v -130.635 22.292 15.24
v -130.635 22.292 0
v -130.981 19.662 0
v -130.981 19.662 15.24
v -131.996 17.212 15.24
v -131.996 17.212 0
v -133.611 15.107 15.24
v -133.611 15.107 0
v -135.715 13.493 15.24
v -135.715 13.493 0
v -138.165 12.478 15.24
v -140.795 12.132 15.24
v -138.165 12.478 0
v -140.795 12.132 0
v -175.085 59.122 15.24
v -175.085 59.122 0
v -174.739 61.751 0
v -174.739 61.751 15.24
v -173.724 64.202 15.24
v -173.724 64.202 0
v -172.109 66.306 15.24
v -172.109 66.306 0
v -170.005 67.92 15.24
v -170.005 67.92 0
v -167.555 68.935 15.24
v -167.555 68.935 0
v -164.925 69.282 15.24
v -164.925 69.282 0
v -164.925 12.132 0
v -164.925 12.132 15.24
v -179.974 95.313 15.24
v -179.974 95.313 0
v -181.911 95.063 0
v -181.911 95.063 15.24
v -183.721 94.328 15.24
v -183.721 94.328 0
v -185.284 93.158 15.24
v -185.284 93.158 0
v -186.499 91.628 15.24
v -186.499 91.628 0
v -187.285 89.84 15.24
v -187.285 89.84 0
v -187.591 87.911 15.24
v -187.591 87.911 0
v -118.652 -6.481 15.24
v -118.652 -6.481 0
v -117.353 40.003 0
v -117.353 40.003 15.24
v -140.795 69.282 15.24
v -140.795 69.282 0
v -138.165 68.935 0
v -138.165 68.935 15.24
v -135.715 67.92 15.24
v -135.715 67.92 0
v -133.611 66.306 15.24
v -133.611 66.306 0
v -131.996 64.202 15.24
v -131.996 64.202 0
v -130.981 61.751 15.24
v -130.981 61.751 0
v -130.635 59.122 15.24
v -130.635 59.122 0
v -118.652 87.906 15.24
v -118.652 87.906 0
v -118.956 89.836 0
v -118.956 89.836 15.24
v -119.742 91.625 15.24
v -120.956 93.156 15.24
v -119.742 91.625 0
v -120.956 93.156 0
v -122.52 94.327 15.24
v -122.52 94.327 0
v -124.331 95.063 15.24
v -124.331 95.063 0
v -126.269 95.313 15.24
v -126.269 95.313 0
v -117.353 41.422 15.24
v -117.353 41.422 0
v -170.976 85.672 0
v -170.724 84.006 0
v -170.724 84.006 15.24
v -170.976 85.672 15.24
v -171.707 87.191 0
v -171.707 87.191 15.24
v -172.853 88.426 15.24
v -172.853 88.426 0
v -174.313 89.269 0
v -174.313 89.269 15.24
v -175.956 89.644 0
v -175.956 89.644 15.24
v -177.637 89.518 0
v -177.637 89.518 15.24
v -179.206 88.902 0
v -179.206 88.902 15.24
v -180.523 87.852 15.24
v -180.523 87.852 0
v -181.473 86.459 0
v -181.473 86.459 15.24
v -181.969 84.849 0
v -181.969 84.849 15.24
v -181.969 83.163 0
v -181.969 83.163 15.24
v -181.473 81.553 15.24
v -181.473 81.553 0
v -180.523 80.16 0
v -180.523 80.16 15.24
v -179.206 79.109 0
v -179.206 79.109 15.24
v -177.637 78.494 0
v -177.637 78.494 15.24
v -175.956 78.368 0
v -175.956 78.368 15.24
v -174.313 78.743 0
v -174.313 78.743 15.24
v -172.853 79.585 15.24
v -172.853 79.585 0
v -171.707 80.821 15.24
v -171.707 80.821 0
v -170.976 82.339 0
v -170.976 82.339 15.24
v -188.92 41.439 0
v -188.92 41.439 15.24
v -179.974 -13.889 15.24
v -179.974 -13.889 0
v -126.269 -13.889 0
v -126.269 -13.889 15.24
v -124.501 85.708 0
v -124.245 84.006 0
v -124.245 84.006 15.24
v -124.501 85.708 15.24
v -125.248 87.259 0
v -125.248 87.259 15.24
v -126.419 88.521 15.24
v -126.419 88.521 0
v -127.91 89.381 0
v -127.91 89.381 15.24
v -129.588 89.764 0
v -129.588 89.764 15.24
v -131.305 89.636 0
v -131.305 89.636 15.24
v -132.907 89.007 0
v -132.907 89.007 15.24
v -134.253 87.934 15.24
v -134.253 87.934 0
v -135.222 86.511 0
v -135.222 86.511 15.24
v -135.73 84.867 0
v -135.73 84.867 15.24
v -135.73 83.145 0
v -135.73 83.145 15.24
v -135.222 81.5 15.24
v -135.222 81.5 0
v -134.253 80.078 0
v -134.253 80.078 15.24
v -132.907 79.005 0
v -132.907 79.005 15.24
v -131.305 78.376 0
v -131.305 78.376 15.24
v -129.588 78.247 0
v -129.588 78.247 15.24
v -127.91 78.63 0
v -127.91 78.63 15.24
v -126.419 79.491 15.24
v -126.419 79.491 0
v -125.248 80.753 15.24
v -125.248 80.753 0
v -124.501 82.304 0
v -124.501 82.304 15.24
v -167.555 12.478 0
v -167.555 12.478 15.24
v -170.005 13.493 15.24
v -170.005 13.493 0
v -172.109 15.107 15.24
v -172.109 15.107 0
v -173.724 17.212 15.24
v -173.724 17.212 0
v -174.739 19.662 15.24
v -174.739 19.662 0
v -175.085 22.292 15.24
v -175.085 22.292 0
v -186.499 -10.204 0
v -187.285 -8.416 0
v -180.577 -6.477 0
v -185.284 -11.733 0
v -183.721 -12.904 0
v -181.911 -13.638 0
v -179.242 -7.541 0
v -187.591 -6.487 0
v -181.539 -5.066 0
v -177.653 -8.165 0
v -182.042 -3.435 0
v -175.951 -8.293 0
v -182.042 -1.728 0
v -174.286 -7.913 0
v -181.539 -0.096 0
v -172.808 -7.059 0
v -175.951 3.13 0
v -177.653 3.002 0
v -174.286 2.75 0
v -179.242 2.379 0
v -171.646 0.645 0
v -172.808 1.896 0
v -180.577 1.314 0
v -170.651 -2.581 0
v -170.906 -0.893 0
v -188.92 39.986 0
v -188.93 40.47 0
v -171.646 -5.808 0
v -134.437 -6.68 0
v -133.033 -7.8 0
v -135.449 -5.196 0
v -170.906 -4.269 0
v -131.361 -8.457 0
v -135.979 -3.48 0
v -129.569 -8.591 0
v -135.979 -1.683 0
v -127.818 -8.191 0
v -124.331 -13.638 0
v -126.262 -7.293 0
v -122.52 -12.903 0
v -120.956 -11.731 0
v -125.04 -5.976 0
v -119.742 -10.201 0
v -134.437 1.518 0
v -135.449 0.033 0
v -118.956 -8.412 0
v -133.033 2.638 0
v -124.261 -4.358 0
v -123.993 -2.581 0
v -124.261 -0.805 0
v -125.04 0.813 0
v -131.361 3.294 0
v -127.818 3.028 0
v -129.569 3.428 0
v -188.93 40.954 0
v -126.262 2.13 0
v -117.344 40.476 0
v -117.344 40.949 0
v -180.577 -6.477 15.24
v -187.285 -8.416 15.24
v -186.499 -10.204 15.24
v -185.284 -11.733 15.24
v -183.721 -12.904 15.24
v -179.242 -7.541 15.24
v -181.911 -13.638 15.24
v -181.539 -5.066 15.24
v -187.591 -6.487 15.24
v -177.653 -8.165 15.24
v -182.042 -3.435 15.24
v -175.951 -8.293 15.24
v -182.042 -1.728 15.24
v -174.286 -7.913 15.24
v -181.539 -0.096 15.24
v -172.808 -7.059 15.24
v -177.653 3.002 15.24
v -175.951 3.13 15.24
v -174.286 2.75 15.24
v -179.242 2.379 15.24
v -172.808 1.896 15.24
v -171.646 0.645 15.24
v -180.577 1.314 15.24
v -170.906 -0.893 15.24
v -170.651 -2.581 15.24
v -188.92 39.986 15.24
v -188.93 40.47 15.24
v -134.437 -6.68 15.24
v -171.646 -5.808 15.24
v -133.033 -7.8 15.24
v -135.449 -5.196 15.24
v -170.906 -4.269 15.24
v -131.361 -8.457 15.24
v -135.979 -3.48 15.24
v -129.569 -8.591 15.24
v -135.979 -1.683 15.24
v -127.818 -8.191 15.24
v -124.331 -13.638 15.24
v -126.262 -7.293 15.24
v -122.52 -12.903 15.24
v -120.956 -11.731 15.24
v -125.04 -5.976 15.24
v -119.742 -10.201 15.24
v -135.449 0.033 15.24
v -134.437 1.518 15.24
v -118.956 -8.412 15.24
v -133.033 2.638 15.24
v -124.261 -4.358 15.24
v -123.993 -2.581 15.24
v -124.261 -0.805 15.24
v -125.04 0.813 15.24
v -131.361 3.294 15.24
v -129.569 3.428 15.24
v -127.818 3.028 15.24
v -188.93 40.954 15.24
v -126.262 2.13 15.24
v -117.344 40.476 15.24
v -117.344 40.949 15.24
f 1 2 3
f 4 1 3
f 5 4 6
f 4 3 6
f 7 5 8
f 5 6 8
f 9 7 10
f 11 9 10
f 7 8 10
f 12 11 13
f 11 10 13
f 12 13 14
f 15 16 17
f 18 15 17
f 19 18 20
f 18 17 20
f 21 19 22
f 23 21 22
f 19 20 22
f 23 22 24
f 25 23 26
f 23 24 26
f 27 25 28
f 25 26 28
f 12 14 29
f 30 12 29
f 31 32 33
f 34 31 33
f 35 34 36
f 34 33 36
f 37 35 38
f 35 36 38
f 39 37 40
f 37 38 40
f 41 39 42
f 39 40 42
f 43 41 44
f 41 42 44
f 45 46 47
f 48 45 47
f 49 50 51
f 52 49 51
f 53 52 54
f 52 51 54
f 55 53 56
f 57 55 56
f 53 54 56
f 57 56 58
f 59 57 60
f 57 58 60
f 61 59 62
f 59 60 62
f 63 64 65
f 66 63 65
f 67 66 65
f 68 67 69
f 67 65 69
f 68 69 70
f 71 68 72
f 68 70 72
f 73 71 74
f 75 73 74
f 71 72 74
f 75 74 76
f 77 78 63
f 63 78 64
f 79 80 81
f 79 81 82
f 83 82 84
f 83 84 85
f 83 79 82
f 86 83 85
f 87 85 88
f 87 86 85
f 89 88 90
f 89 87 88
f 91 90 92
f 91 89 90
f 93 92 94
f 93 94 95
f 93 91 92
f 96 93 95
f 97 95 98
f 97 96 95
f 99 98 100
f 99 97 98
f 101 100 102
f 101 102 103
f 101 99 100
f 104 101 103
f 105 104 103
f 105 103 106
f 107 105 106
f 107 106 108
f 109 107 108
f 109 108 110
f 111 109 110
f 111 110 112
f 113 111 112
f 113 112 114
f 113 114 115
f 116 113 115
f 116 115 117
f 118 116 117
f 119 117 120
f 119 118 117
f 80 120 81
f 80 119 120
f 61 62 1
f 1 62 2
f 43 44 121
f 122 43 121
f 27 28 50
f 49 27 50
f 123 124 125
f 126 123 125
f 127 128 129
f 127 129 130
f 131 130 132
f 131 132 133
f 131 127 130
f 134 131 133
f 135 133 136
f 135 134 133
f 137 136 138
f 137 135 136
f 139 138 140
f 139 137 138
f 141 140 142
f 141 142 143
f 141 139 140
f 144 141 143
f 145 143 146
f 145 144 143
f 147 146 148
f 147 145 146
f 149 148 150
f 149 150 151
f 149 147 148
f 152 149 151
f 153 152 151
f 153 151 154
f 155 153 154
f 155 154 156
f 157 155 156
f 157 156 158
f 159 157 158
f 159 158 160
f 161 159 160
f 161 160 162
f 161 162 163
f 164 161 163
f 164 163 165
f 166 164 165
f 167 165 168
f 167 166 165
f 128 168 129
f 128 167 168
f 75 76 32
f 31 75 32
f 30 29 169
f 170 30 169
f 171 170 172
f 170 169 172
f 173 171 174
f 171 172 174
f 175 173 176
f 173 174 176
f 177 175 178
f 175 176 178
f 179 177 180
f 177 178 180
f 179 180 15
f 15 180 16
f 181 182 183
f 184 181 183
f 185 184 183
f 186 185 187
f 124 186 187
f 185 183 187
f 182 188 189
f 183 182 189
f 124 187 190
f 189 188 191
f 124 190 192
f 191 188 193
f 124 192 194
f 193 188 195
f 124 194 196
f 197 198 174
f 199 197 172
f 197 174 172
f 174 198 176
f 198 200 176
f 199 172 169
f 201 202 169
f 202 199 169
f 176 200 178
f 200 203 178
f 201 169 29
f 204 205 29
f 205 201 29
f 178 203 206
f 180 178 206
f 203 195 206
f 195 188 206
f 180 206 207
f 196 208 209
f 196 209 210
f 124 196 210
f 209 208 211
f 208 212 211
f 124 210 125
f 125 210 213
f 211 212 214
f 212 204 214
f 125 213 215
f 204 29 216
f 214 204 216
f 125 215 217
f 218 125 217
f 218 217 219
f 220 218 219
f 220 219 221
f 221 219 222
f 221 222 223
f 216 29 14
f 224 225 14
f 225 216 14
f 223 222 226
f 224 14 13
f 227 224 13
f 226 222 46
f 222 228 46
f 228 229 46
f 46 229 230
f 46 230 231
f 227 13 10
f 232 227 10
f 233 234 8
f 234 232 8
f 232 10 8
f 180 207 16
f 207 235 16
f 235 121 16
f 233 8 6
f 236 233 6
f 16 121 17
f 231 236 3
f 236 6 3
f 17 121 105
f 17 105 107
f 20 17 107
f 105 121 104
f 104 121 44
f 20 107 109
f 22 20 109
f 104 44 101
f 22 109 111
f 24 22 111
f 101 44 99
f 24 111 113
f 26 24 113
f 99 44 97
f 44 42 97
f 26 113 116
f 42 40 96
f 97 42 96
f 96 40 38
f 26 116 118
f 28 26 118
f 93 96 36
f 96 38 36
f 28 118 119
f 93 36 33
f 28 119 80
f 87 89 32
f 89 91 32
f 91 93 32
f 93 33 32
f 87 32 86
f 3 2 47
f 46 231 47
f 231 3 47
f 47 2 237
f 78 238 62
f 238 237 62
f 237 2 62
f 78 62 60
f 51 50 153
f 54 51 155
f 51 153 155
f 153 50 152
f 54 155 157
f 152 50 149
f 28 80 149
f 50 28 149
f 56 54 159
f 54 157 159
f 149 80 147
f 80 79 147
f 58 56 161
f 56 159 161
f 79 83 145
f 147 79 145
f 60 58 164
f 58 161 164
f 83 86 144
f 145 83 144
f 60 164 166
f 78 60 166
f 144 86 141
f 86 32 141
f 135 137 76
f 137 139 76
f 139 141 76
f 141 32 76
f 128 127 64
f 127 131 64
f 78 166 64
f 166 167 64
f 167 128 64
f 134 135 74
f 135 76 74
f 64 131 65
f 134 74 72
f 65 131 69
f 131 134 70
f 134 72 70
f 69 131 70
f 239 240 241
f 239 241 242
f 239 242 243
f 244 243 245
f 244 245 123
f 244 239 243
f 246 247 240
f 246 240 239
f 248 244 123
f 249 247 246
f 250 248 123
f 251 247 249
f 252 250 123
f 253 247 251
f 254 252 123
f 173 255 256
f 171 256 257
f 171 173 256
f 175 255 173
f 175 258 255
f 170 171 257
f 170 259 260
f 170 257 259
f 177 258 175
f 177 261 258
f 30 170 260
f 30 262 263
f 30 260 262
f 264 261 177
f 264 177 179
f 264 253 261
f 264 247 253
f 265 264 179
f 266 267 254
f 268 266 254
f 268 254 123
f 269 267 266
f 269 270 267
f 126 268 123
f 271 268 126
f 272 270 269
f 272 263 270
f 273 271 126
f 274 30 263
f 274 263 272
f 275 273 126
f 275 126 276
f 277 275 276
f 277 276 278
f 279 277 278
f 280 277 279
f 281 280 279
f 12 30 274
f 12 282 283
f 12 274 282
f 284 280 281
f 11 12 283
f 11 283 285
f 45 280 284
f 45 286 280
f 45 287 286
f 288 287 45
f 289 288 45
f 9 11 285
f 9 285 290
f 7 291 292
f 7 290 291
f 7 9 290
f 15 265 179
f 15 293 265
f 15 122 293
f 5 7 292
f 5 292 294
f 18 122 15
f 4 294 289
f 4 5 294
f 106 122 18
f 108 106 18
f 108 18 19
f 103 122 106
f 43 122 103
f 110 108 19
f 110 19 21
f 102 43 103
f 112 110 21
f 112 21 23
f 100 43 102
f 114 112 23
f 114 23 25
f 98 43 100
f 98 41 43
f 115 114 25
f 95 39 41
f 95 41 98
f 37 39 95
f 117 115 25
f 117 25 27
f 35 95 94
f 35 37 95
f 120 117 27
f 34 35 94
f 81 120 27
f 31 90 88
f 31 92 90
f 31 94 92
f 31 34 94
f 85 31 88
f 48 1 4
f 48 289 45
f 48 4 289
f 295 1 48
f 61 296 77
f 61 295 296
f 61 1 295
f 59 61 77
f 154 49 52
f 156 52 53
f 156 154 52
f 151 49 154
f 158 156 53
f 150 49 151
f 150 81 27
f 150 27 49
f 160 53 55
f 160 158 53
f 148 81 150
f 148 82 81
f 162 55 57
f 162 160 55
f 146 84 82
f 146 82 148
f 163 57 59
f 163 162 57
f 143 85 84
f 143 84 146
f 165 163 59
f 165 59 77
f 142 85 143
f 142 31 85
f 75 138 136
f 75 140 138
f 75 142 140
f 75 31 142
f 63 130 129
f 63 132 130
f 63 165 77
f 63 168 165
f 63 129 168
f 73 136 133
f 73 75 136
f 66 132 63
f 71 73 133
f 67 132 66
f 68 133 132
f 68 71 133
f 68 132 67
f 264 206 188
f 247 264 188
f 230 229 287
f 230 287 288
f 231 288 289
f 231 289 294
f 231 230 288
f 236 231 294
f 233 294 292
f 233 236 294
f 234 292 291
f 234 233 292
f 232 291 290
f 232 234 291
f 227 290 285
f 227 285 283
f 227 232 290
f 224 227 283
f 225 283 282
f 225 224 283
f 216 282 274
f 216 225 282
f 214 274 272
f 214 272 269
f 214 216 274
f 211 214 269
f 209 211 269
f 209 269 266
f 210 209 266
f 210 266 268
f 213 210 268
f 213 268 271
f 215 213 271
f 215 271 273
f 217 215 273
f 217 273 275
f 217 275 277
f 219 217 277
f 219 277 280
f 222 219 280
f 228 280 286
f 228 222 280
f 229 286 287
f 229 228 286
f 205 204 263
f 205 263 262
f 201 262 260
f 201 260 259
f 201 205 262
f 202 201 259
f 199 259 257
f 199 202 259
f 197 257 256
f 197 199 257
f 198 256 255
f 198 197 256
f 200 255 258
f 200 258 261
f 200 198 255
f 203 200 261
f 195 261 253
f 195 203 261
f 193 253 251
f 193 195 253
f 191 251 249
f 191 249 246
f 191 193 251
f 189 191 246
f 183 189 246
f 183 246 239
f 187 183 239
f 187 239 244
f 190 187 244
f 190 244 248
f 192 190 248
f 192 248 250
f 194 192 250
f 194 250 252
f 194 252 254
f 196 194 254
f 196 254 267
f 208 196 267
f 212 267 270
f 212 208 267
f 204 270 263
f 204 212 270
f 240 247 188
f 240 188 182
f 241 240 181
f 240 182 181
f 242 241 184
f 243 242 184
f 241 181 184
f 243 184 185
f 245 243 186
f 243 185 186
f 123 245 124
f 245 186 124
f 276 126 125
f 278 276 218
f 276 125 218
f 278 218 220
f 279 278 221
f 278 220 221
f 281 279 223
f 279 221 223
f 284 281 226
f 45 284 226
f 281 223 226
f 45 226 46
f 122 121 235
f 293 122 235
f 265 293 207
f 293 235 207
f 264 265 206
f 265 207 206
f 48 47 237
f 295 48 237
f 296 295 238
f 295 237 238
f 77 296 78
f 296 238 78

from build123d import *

# Parameters (mm, degrees)
F0_R        = 5.7271899427
F0_R_2      = 6.0263161758
F0_R_3      = 5.6540098822
F0_R_4      = 5.7746792183
F1_DEPTH    = 15.24
F2_T1_DEPTH = 18.788208103
F2_T3_DEPTH = 18.873984206


# Not quite as in the source:
# - a fillet or chamfer that OpenCascade refuses, or shapes differently, is made with other operations: its cross-section is extruded or revolved along the edge and cut away or added


with BuildPart() as f1:
    # F0 (on Top) → F1 (new body)
    with BuildSketch(Plane.XY):
        with BuildLine():
            Line((-126.2685924224, 95.313180417), (-179.9737472962, 95.313180417))
            ThreePointArc((-179.9737472962, 95.313180417), (-185.2842850362, 93.1578477365), (-187.5906297205, 87.9111302629))
            Line((-187.5906297205, 87.9111302629), (-188.941179568, 40.7122925946))
            Line((-188.941179568, 40.7122925946), (-187.5906297205, -6.4865450738))
            ThreePointArc((-187.5906297205, -6.4865450738), (-185.2842850362, -11.7332625474), (-179.9737472962, -13.8885952279))
            Line((-179.9737472962, -13.8885952279), (-126.2685924224, -13.8885952279))
            ThreePointArc((-126.2685924224, -13.8885952279), (-120.9562110346, -11.7314702942), (-118.6515646464, -6.4814046742))
            Line((-118.6515646464, -6.4814046742), (-117.3330366223, 40.7122925946))
            Line((-117.3330366223, 40.7122925946), (-118.6515646464, 87.9059898633))
            ThreePointArc((-118.6515646464, 87.9059898633), (-120.9562110346, 93.1560554834), (-126.2685924224, 95.313180417))
        make_face()
        with Locations((-176.378503075, -2.5813533248)):
            Circle(F0_R, mode=Mode.SUBTRACT)
        with Locations((-130.0195976365, -2.5813533248)):
            Circle(F0_R_2, mode=Mode.SUBTRACT)
        with BuildLine():
            Line((-130.635044248, 59.1215779044), (-130.6350442799, 22.2915779044))
            ThreePointArc((-130.6350442799, 22.2915779044), (-133.610839383, 15.1073730075), (-140.7950442799, 12.1315779044))
            Line((-140.7950442799, 12.1315779044), (-164.9250442799, 12.1315779044))
            ThreePointArc((-164.9250442799, 12.1315779044), (-172.1092491767, 15.1073730075), (-175.0850442799, 22.2915779044))
            Line((-175.0850442799, 22.2915779044), (-175.0850442799, 59.1215779044))
            ThreePointArc((-175.0850442799, 59.1215779044), (-172.1092491767, 66.3057828012), (-164.9250442799, 69.2815779044))
            Line((-164.9250442799, 69.2815779044), (-140.7950442799, 69.2815779044))
            ThreePointArc((-140.7950442799, 69.2815779044), (-133.6108393717, 66.3057828031), (-130.635044248, 59.1215779044))
        make_face(mode=Mode.SUBTRACT)
        with Locations((-176.378503075, 84.005938514)):
            Circle(F0_R_3, mode=Mode.SUBTRACT)
        with Locations((-130.0195976365, 84.005938514)):
            Circle(F0_R_4, mode=Mode.SUBTRACT)
    extrude(amount=F1_DEPTH)

    # F2: fillet of radius 25.4 on 2 edges, made by hand

    # F2_s2 → F2_t1 (cut)
    with BuildSketch(Plane.XY.offset(-1.7741040515)):
        with BuildLine():
            ThreePointArc((-117.3528553153, 40.0029277737), (-117.3429479018, 40.7122925946), (-117.3528553153, 41.4216574155))
            Line((-117.3528553153, 41.4216574155), (-117.3330366223, 40.7122925946))
            Line((-117.3330366223, 40.7122925946), (-117.3528553153, 40.0029277737))
        make_face()
    extrude(amount=F2_T1_DEPTH, mode=Mode.SUBTRACT)

    # F2_s4 → F2_t3 (cut)
    with BuildSketch(Plane.XY.offset(-1.816992103)):
        with BuildLine():
            ThreePointArc((-188.9203914761, 41.4387920809), (-188.9307833954, 40.7122925946), (-188.9203914761, 39.9857931082))
            Line((-188.9203914761, 39.9857931082), (-188.941179568, 40.7122925946))
            Line((-188.941179568, 40.7122925946), (-188.9203914761, 41.4387920809))
        make_face()
    extrude(amount=F2_T3_DEPTH, mode=Mode.SUBTRACT)


solid = f1.part
